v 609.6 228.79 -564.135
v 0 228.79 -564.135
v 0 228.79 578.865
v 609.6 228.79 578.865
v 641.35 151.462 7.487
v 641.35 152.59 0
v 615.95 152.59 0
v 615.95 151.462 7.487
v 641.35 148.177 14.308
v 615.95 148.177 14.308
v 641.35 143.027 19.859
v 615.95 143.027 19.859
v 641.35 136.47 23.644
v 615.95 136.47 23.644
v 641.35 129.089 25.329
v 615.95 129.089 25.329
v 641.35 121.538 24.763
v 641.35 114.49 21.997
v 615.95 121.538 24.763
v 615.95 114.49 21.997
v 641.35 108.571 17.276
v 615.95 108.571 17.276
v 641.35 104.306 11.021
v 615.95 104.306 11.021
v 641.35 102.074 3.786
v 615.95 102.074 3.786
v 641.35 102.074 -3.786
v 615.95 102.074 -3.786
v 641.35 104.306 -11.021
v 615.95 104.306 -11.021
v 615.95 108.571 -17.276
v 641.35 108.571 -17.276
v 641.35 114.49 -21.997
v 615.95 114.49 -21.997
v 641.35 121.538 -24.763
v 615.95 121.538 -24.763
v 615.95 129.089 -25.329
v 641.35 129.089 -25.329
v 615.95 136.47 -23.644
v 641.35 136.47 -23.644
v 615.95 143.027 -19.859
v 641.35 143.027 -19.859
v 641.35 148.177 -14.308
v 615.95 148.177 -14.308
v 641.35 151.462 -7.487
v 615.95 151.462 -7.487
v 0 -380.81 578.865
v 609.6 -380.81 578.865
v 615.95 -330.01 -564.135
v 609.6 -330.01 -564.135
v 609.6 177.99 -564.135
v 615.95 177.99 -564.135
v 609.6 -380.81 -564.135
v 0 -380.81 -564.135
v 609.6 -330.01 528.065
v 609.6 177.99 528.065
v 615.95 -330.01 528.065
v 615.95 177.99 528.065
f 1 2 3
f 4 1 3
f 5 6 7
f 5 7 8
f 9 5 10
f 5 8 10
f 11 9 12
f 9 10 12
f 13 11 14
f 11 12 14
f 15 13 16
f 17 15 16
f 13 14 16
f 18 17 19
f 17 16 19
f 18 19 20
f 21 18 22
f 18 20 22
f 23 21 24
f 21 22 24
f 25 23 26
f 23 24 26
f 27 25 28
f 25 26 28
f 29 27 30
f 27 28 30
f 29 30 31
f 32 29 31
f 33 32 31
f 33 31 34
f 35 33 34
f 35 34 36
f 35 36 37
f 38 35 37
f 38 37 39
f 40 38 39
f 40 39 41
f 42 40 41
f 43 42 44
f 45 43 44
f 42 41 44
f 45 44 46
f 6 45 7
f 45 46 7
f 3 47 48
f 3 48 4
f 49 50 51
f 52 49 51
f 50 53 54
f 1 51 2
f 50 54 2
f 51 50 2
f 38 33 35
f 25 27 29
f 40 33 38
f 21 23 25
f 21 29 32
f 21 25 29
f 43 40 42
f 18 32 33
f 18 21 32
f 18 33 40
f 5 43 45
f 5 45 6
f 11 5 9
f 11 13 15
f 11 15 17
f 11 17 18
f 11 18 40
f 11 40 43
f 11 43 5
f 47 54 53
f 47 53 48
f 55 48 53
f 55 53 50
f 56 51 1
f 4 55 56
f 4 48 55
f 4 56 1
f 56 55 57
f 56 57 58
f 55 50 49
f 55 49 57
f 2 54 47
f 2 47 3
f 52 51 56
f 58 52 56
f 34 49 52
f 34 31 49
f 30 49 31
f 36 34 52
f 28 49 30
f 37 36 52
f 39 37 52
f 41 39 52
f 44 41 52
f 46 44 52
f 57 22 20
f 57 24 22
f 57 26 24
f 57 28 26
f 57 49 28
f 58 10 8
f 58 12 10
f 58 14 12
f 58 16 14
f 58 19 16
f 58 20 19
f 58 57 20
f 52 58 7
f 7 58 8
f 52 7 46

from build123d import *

# Parameters (mm, degrees)
F0_W     = 609.6
F0_H     = 1143
F1_DEPTH = 609.6
F2_W     = 508
F2_H     = 1092.2
F3_DEPTH = 6.35
F4_R     = 25.4
F5_DEPTH = 25.4


with BuildPart() as f1:
    # F0 (on Right) → F1 (new body)
    with BuildSketch(Plane.YZ):
        with Locations((-76.00952, 7.364793)):
            Rectangle(F0_W, F0_H)
    extrude(amount=F1_DEPTH)

    # F2 (on face) → F3 (join)
    with BuildSketch(Plane.YZ.offset(609.6)):
        with Locations((-76.00952, -18.035207)):
            Rectangle(F2_W, F2_H)
    extrude(amount=F3_DEPTH)

    # F4 (on face) → F5 (join)
    with BuildSketch(Plane.YZ.offset(615.95)):
        with Locations((127.19048, 0)):
            Circle(F4_R)
    extrude(amount=F5_DEPTH)


solid = f1.part
